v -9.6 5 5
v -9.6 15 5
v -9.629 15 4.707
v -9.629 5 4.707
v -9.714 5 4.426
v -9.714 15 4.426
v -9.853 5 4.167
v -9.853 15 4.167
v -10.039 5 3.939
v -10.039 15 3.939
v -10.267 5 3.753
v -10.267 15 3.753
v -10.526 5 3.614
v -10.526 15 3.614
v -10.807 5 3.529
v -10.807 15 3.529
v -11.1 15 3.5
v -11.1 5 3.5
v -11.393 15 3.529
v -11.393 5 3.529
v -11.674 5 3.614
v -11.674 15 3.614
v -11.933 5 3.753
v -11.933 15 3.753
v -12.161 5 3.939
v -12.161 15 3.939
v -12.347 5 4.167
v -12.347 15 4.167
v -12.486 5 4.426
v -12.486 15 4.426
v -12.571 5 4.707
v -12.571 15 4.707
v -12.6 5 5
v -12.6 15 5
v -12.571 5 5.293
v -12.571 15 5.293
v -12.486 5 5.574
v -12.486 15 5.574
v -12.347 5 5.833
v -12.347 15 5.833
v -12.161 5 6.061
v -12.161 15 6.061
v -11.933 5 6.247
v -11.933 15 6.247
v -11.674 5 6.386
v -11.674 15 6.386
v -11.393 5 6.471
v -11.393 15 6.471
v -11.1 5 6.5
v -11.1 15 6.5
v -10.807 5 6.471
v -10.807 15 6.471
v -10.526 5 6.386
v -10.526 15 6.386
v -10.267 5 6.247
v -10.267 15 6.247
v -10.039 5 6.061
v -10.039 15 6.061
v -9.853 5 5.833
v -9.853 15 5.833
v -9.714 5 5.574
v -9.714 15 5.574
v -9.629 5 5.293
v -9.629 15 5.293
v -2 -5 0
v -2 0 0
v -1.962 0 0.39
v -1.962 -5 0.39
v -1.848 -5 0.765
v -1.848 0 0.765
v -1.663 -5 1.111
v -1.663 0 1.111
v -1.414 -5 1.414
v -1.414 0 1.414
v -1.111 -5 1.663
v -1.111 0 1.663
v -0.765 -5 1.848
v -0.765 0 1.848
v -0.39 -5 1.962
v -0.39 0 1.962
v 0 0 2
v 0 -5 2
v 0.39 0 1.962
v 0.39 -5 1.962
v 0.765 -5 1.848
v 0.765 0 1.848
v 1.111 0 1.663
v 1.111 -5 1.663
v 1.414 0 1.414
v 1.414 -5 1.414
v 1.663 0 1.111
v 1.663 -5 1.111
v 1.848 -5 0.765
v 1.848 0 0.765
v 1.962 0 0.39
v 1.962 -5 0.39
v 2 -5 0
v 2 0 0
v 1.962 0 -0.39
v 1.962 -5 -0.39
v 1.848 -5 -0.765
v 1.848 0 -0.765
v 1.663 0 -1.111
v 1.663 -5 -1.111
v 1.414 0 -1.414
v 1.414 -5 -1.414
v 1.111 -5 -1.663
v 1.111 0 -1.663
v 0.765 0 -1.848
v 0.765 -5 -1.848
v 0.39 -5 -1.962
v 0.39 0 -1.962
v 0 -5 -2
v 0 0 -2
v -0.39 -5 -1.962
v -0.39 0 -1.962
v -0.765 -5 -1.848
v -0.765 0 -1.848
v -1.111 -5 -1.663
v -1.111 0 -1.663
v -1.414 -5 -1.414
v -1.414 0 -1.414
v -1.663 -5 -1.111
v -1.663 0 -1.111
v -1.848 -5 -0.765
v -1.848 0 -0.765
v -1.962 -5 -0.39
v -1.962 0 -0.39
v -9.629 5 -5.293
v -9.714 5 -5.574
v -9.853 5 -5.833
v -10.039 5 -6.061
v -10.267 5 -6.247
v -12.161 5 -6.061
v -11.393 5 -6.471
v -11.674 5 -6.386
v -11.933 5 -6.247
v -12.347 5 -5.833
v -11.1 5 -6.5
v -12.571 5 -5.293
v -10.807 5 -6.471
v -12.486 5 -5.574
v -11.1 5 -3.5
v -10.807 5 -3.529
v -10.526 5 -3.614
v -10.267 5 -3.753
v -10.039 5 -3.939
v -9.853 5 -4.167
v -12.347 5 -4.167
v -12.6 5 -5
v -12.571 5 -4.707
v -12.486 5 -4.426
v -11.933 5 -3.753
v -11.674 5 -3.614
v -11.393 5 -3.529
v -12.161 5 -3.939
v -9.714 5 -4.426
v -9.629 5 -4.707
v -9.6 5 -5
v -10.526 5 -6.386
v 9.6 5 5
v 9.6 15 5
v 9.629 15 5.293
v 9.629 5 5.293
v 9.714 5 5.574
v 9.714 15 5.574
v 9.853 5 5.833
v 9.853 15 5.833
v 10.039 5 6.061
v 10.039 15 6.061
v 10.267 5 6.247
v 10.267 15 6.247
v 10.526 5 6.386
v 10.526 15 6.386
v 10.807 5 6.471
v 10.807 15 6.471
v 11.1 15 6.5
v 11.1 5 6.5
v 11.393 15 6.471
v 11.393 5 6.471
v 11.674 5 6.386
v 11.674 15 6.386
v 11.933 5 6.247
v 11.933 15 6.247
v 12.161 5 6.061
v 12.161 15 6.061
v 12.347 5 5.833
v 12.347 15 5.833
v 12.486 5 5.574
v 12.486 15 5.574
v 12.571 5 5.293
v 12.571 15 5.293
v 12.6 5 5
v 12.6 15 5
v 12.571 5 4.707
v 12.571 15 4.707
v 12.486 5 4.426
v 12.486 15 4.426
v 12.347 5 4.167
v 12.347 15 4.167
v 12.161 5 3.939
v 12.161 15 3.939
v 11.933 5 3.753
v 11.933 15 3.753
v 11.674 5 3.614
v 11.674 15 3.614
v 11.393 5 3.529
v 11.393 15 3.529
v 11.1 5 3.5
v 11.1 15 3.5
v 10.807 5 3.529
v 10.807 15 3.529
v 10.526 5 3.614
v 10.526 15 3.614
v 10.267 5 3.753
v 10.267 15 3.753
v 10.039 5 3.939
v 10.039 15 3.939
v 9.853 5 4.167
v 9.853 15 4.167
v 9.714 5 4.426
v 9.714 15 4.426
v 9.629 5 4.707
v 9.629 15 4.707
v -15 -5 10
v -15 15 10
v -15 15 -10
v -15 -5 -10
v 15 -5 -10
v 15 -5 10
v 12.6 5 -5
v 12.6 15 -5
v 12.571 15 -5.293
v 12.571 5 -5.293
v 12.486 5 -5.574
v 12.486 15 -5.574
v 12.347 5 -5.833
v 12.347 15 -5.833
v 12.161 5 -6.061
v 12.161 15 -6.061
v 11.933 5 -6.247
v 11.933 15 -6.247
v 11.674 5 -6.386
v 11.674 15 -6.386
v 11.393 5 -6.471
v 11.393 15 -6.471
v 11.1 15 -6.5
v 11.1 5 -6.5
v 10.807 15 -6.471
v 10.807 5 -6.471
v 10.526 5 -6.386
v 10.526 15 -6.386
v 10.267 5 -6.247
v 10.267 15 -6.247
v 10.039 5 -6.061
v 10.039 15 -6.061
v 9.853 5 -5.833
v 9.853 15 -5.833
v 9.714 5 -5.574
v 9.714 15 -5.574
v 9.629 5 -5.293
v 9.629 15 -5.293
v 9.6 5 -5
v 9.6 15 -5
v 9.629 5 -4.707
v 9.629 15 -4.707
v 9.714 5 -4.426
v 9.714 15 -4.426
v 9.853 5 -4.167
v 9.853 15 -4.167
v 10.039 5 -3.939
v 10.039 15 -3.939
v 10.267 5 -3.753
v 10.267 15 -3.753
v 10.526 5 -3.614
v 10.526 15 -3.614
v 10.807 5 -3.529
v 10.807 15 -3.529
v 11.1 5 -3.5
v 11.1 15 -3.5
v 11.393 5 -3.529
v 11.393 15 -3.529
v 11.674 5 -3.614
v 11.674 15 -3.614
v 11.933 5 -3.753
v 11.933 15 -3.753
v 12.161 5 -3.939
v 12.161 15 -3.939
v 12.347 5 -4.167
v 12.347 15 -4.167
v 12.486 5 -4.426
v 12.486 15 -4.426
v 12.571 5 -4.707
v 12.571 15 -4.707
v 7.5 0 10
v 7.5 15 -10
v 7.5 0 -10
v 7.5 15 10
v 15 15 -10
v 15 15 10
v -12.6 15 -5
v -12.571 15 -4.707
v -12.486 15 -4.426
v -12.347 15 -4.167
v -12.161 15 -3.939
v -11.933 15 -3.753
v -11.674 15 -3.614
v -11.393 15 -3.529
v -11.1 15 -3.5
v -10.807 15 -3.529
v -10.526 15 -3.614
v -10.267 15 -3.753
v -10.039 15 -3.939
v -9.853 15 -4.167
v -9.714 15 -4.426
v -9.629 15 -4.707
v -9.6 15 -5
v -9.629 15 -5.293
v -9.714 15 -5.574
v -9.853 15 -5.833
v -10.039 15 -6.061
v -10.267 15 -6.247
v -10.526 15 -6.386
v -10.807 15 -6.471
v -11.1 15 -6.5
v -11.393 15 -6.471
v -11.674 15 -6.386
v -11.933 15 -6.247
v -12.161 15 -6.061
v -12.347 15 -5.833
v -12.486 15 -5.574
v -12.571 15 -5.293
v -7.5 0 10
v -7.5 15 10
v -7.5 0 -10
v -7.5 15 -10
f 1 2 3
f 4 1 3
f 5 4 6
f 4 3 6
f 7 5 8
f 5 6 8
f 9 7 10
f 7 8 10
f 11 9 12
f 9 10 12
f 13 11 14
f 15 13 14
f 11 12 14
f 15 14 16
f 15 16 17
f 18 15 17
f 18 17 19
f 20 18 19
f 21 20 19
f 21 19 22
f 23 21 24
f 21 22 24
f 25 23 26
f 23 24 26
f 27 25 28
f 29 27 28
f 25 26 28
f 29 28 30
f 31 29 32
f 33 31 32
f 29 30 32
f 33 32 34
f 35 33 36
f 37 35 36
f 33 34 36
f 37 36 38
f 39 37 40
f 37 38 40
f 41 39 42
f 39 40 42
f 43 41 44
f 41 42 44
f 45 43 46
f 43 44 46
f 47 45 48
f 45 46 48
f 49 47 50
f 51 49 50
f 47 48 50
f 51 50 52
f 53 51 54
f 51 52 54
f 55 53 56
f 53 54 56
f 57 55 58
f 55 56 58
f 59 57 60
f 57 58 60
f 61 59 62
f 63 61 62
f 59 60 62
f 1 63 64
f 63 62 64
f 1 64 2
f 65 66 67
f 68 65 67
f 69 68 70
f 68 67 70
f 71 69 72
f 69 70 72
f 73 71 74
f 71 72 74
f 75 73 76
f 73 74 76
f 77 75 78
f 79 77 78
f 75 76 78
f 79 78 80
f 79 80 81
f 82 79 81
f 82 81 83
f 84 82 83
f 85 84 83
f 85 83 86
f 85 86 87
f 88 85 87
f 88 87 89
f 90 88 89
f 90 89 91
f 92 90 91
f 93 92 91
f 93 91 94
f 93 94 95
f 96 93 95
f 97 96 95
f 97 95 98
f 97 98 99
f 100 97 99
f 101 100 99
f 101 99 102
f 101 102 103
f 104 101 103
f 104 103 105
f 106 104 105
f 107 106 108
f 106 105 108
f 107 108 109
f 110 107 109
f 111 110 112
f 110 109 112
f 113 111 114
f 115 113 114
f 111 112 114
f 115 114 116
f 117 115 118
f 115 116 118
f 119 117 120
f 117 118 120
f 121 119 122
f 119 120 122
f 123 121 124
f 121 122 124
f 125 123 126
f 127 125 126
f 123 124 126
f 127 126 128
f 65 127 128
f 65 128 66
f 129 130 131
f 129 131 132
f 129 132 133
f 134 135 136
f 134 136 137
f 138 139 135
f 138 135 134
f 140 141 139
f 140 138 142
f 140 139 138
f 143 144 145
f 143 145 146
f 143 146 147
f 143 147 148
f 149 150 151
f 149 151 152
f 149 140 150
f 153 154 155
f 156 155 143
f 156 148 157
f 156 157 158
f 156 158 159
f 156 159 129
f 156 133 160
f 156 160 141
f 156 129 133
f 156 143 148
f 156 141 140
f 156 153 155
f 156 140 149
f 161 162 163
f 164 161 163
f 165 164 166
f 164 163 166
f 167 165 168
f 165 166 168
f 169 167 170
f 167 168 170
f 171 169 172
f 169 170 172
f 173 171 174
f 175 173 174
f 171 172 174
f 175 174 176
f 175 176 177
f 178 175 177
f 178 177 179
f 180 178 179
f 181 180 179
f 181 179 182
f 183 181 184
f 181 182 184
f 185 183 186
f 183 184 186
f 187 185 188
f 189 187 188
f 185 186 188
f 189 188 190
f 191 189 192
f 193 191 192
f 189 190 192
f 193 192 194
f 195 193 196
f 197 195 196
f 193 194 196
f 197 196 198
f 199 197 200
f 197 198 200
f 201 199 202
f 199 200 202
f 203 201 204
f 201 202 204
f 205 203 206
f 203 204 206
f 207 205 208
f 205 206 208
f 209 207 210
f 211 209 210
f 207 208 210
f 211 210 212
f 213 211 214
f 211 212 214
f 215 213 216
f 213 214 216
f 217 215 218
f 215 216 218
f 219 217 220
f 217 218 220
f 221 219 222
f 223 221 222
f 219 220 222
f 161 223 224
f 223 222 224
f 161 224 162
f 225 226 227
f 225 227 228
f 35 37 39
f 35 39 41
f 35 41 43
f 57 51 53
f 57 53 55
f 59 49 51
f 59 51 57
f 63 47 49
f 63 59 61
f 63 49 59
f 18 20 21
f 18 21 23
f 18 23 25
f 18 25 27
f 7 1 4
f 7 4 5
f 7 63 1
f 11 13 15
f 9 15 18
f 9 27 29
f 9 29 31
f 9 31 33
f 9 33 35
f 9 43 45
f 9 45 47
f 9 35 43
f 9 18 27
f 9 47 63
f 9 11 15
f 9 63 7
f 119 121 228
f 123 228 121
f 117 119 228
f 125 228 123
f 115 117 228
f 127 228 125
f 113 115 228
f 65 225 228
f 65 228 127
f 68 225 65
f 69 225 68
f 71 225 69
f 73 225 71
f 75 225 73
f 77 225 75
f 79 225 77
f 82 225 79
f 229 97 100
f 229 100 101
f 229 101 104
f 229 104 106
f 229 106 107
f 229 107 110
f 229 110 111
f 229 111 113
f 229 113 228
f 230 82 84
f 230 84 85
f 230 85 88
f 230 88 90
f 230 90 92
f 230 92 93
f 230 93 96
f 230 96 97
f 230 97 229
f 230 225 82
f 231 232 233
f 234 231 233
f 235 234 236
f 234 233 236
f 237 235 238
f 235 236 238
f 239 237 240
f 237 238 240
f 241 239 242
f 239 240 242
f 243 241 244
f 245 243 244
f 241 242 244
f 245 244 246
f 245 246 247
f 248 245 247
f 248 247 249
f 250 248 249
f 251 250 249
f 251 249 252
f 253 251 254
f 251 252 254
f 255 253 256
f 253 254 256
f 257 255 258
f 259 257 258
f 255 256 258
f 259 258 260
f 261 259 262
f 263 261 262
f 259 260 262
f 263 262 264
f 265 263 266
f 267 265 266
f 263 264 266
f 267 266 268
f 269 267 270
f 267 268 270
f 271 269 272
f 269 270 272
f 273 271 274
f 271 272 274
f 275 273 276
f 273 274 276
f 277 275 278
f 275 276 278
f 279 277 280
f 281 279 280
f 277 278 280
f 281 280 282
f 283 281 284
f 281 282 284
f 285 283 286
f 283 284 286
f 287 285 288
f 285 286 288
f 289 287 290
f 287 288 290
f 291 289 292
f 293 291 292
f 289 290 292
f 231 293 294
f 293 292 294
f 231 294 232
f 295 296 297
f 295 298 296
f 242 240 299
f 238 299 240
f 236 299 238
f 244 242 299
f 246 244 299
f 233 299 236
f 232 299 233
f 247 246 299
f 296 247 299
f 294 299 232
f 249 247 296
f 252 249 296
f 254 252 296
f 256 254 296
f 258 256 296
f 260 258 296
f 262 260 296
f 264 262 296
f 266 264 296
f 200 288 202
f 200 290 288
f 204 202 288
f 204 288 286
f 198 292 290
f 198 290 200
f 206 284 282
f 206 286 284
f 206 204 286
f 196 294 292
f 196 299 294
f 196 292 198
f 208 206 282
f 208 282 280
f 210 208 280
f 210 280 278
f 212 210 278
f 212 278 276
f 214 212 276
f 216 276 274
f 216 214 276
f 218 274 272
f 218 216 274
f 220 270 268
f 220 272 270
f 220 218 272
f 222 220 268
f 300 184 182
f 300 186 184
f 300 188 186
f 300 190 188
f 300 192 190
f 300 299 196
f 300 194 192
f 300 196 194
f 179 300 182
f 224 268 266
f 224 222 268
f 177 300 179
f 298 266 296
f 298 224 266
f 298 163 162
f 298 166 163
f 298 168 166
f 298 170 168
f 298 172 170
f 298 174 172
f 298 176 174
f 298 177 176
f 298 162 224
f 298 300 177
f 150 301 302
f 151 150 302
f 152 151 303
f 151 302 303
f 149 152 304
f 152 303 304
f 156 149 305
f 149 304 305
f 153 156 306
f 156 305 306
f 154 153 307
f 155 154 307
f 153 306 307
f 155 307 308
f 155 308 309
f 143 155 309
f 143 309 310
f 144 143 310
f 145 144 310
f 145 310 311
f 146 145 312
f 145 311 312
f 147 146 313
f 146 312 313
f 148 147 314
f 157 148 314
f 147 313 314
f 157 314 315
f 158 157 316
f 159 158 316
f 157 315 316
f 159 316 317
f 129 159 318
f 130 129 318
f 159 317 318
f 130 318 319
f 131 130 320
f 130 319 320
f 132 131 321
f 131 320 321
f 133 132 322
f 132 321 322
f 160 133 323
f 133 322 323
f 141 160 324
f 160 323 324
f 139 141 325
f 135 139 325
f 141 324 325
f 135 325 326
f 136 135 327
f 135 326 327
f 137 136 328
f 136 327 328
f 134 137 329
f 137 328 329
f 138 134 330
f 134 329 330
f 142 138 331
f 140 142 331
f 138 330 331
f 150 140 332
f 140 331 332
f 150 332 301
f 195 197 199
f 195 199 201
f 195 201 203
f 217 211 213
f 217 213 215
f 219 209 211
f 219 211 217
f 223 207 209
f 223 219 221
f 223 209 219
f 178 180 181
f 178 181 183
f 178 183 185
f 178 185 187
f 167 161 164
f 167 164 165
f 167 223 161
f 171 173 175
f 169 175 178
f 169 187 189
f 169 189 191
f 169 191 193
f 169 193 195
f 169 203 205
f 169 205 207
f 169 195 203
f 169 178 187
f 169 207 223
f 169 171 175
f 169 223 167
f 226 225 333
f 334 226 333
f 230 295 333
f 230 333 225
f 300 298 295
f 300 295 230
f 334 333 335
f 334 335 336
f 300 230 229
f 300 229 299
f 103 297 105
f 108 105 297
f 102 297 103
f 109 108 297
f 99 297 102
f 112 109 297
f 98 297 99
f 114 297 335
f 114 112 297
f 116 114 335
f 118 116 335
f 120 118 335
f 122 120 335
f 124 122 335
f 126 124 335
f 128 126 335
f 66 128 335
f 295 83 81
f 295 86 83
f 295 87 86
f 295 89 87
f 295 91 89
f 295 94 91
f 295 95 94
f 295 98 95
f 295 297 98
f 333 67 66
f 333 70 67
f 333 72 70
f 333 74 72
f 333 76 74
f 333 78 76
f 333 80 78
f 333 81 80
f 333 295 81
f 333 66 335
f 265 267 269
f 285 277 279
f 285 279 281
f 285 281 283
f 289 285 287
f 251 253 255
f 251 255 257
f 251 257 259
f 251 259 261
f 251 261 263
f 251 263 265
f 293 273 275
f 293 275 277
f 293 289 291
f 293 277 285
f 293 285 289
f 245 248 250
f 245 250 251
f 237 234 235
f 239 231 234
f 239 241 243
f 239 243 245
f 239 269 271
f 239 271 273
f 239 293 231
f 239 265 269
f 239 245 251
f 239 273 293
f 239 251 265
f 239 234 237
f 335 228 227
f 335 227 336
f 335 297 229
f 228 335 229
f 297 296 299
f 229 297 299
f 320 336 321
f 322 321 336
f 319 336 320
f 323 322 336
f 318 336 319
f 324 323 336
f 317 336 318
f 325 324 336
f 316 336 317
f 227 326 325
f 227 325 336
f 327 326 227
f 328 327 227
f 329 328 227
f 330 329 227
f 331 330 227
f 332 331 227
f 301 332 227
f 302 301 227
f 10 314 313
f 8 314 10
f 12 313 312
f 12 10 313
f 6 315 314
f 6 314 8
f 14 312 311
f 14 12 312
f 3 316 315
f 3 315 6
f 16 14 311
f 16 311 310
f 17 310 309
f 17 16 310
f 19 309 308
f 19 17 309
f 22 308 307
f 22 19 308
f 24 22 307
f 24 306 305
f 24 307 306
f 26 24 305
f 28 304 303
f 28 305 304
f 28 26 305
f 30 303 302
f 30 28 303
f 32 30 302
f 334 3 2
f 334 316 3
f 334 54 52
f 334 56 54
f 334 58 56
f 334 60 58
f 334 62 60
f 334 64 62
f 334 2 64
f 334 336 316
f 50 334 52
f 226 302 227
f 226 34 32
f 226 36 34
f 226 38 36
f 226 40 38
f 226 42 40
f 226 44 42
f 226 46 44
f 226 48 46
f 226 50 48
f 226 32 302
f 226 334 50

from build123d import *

# Parameters (mm, degrees)
EXTRUDE_1_DEPTH     = 10
SKETCH_2_R          = 1.5
CUT_EXTRUDE_1_DEPTH = 10
CUT_EXTRUDE_2_REACH = 25.452
SKETCH_3_R          = 2


with BuildPart() as part:
    # 草图1 → 凸台-拉伸1 (new, symmetric)
    with BuildSketch(Plane.XY):
        Polygon((7.5, 0), (-7.5, 0), (-7.5, 15), (-15, 15), (-15, -5), (15, -5), (15, 15), (7.5, 15), align=None)
    extrude(amount=EXTRUDE_1_DEPTH, both=True)

    # 草图2 → 切除-拉伸1 (cut)
    with BuildSketch(Plane(origin=(0, 15, 0), x_dir=(1, 0, 0), z_dir=(0, 1, 0))):
        with Locations(Location((-11.1, 5, 0), (0, 0, 180))):
            Circle(SKETCH_2_R)
        with Locations(Location((11.1, -5, 0), (0, 0, 180))):
            Circle(SKETCH_2_R)
        with Locations((11.1, 5)):
            Circle(SKETCH_2_R)
        with Locations((-11.1, -5)):
            Circle(SKETCH_2_R)
    extrude(amount=-CUT_EXTRUDE_1_DEPTH, mode=Mode.SUBTRACT)

    # 草图3 → 切除-拉伸2 (cut, up to next)
    with BuildSketch(Plane(origin=(0, 0, 0), x_dir=(1, 0, 0), z_dir=(0, 1, 0)), mode=Mode.PRIVATE) as cut_extrude_2_sk1:
        with Locations(Location((0, 0, 0), (0, 0, 180))):
            Circle(SKETCH_3_R)
    cut_extrude_2_tool1 = extrude(cut_extrude_2_sk1.sketch, amount=-CUT_EXTRUDE_2_REACH, mode=Mode.PRIVATE) & part.part
    add(cut_extrude_2_tool1.solids().sort_by_distance((0, 0, 0))[0], mode=Mode.SUBTRACT)


solid = part.part
